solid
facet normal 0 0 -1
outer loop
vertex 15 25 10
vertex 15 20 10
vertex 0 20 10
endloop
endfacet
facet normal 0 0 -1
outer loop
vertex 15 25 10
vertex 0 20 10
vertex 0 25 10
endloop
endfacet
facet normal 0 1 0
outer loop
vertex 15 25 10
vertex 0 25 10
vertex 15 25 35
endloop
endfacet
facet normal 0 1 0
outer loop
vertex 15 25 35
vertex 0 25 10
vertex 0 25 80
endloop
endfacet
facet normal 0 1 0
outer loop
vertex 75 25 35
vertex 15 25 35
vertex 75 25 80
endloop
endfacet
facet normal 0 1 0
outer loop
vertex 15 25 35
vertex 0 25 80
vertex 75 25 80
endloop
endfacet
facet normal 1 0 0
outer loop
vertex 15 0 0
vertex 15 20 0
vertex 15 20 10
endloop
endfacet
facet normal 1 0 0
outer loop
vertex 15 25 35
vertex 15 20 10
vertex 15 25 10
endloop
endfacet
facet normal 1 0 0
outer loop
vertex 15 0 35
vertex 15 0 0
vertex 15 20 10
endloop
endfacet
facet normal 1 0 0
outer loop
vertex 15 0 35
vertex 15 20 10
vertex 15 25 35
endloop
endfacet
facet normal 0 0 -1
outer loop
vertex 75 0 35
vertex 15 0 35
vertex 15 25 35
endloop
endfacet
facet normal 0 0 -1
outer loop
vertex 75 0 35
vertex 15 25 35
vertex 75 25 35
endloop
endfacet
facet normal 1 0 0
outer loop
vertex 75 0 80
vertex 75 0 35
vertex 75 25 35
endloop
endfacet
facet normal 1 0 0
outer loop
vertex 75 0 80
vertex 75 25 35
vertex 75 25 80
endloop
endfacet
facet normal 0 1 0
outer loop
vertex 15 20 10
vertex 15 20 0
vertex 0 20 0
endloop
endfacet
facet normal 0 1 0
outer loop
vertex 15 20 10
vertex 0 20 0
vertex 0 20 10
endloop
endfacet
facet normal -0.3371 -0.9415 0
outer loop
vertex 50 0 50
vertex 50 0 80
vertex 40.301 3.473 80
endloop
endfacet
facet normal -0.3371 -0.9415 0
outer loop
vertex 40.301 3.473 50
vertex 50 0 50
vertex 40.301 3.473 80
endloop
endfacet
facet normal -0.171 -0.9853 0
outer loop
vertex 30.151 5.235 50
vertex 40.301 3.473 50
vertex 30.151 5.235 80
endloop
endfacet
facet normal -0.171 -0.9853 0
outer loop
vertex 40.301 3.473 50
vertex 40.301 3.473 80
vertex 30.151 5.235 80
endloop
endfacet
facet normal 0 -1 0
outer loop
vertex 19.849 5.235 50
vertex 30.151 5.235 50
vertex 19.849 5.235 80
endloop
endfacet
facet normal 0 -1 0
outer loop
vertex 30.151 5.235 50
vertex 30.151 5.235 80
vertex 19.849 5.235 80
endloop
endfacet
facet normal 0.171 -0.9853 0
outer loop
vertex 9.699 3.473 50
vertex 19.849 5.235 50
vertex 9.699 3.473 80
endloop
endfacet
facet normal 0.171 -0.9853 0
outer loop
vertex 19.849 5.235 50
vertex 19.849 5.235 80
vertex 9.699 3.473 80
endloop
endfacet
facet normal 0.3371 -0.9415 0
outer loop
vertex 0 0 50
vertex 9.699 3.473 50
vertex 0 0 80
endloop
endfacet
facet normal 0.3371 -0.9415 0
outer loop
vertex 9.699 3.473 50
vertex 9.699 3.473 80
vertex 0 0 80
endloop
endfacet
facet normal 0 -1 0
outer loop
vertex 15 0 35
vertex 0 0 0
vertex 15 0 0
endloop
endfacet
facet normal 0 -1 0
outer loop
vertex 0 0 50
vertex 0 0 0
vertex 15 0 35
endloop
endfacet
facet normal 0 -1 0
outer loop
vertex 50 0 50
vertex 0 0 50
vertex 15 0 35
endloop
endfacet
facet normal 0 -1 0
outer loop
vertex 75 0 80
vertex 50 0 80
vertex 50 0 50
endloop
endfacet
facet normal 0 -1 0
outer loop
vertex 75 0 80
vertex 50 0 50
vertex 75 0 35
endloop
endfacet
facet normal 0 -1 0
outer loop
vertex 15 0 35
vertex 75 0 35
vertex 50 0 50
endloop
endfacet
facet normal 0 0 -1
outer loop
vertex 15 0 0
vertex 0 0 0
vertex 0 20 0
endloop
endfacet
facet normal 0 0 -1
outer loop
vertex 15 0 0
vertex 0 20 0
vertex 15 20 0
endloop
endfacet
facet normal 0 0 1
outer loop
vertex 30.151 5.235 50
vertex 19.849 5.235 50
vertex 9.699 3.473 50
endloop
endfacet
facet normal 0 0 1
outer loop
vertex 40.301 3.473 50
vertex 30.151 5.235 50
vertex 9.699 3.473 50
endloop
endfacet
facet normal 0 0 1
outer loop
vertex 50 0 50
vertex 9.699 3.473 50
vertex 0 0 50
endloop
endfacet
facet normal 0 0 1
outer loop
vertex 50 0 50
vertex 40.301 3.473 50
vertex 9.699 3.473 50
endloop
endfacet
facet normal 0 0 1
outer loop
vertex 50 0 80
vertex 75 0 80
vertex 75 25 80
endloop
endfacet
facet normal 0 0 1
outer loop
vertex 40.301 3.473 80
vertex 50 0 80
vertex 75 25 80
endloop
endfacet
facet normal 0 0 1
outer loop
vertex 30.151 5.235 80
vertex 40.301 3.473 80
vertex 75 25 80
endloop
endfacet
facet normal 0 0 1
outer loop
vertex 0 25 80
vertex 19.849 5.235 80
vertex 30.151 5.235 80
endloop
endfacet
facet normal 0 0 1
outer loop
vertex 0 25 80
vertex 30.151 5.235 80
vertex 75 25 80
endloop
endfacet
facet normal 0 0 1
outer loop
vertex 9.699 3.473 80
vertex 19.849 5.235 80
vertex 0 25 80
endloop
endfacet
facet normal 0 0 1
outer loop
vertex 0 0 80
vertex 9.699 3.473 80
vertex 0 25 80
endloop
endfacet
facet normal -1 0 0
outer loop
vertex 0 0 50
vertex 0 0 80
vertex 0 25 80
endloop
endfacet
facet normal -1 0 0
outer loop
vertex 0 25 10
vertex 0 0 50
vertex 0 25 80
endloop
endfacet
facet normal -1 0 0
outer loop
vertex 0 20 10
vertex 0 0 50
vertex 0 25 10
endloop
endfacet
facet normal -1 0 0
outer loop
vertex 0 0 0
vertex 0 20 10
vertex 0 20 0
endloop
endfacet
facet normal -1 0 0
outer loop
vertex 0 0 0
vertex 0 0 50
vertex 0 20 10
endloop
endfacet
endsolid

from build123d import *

# Parameters (mm, degrees)
F1_DEPTH = 25
F3_DEPTH = 30
F4_W     = 5
F4_H     = 10
F5_DEPTH = 15.001


with BuildPart() as f1:
    # F0 (on Front) → F1 (new body)
    with BuildSketch(Plane.XZ):
        Polygon((0, 80), (0, 0), (15, 0), (15, 35), (75, 35), (75, 80), align=None)
    extrude(amount=-F1_DEPTH)

    # F2 (on face) → F3 (cut)
    with BuildSketch(Plane.XY.offset(80)):
        with BuildLine():
            ThreePointArc((50, 0), (25, 5.456439), (0, 0))
            Line((0, 0), (50, 0))
        make_face()
    extrude(amount=-F3_DEPTH, mode=Mode.SUBTRACT)

    # F4 (on face) → F5 (cut, through all)
    with BuildSketch(Plane.YZ.offset(15)):
        with Locations((22.5, 5)):
            Rectangle(F4_W, F4_H)
    extrude(amount=-F5_DEPTH, mode=Mode.SUBTRACT)


solid = f1.part
